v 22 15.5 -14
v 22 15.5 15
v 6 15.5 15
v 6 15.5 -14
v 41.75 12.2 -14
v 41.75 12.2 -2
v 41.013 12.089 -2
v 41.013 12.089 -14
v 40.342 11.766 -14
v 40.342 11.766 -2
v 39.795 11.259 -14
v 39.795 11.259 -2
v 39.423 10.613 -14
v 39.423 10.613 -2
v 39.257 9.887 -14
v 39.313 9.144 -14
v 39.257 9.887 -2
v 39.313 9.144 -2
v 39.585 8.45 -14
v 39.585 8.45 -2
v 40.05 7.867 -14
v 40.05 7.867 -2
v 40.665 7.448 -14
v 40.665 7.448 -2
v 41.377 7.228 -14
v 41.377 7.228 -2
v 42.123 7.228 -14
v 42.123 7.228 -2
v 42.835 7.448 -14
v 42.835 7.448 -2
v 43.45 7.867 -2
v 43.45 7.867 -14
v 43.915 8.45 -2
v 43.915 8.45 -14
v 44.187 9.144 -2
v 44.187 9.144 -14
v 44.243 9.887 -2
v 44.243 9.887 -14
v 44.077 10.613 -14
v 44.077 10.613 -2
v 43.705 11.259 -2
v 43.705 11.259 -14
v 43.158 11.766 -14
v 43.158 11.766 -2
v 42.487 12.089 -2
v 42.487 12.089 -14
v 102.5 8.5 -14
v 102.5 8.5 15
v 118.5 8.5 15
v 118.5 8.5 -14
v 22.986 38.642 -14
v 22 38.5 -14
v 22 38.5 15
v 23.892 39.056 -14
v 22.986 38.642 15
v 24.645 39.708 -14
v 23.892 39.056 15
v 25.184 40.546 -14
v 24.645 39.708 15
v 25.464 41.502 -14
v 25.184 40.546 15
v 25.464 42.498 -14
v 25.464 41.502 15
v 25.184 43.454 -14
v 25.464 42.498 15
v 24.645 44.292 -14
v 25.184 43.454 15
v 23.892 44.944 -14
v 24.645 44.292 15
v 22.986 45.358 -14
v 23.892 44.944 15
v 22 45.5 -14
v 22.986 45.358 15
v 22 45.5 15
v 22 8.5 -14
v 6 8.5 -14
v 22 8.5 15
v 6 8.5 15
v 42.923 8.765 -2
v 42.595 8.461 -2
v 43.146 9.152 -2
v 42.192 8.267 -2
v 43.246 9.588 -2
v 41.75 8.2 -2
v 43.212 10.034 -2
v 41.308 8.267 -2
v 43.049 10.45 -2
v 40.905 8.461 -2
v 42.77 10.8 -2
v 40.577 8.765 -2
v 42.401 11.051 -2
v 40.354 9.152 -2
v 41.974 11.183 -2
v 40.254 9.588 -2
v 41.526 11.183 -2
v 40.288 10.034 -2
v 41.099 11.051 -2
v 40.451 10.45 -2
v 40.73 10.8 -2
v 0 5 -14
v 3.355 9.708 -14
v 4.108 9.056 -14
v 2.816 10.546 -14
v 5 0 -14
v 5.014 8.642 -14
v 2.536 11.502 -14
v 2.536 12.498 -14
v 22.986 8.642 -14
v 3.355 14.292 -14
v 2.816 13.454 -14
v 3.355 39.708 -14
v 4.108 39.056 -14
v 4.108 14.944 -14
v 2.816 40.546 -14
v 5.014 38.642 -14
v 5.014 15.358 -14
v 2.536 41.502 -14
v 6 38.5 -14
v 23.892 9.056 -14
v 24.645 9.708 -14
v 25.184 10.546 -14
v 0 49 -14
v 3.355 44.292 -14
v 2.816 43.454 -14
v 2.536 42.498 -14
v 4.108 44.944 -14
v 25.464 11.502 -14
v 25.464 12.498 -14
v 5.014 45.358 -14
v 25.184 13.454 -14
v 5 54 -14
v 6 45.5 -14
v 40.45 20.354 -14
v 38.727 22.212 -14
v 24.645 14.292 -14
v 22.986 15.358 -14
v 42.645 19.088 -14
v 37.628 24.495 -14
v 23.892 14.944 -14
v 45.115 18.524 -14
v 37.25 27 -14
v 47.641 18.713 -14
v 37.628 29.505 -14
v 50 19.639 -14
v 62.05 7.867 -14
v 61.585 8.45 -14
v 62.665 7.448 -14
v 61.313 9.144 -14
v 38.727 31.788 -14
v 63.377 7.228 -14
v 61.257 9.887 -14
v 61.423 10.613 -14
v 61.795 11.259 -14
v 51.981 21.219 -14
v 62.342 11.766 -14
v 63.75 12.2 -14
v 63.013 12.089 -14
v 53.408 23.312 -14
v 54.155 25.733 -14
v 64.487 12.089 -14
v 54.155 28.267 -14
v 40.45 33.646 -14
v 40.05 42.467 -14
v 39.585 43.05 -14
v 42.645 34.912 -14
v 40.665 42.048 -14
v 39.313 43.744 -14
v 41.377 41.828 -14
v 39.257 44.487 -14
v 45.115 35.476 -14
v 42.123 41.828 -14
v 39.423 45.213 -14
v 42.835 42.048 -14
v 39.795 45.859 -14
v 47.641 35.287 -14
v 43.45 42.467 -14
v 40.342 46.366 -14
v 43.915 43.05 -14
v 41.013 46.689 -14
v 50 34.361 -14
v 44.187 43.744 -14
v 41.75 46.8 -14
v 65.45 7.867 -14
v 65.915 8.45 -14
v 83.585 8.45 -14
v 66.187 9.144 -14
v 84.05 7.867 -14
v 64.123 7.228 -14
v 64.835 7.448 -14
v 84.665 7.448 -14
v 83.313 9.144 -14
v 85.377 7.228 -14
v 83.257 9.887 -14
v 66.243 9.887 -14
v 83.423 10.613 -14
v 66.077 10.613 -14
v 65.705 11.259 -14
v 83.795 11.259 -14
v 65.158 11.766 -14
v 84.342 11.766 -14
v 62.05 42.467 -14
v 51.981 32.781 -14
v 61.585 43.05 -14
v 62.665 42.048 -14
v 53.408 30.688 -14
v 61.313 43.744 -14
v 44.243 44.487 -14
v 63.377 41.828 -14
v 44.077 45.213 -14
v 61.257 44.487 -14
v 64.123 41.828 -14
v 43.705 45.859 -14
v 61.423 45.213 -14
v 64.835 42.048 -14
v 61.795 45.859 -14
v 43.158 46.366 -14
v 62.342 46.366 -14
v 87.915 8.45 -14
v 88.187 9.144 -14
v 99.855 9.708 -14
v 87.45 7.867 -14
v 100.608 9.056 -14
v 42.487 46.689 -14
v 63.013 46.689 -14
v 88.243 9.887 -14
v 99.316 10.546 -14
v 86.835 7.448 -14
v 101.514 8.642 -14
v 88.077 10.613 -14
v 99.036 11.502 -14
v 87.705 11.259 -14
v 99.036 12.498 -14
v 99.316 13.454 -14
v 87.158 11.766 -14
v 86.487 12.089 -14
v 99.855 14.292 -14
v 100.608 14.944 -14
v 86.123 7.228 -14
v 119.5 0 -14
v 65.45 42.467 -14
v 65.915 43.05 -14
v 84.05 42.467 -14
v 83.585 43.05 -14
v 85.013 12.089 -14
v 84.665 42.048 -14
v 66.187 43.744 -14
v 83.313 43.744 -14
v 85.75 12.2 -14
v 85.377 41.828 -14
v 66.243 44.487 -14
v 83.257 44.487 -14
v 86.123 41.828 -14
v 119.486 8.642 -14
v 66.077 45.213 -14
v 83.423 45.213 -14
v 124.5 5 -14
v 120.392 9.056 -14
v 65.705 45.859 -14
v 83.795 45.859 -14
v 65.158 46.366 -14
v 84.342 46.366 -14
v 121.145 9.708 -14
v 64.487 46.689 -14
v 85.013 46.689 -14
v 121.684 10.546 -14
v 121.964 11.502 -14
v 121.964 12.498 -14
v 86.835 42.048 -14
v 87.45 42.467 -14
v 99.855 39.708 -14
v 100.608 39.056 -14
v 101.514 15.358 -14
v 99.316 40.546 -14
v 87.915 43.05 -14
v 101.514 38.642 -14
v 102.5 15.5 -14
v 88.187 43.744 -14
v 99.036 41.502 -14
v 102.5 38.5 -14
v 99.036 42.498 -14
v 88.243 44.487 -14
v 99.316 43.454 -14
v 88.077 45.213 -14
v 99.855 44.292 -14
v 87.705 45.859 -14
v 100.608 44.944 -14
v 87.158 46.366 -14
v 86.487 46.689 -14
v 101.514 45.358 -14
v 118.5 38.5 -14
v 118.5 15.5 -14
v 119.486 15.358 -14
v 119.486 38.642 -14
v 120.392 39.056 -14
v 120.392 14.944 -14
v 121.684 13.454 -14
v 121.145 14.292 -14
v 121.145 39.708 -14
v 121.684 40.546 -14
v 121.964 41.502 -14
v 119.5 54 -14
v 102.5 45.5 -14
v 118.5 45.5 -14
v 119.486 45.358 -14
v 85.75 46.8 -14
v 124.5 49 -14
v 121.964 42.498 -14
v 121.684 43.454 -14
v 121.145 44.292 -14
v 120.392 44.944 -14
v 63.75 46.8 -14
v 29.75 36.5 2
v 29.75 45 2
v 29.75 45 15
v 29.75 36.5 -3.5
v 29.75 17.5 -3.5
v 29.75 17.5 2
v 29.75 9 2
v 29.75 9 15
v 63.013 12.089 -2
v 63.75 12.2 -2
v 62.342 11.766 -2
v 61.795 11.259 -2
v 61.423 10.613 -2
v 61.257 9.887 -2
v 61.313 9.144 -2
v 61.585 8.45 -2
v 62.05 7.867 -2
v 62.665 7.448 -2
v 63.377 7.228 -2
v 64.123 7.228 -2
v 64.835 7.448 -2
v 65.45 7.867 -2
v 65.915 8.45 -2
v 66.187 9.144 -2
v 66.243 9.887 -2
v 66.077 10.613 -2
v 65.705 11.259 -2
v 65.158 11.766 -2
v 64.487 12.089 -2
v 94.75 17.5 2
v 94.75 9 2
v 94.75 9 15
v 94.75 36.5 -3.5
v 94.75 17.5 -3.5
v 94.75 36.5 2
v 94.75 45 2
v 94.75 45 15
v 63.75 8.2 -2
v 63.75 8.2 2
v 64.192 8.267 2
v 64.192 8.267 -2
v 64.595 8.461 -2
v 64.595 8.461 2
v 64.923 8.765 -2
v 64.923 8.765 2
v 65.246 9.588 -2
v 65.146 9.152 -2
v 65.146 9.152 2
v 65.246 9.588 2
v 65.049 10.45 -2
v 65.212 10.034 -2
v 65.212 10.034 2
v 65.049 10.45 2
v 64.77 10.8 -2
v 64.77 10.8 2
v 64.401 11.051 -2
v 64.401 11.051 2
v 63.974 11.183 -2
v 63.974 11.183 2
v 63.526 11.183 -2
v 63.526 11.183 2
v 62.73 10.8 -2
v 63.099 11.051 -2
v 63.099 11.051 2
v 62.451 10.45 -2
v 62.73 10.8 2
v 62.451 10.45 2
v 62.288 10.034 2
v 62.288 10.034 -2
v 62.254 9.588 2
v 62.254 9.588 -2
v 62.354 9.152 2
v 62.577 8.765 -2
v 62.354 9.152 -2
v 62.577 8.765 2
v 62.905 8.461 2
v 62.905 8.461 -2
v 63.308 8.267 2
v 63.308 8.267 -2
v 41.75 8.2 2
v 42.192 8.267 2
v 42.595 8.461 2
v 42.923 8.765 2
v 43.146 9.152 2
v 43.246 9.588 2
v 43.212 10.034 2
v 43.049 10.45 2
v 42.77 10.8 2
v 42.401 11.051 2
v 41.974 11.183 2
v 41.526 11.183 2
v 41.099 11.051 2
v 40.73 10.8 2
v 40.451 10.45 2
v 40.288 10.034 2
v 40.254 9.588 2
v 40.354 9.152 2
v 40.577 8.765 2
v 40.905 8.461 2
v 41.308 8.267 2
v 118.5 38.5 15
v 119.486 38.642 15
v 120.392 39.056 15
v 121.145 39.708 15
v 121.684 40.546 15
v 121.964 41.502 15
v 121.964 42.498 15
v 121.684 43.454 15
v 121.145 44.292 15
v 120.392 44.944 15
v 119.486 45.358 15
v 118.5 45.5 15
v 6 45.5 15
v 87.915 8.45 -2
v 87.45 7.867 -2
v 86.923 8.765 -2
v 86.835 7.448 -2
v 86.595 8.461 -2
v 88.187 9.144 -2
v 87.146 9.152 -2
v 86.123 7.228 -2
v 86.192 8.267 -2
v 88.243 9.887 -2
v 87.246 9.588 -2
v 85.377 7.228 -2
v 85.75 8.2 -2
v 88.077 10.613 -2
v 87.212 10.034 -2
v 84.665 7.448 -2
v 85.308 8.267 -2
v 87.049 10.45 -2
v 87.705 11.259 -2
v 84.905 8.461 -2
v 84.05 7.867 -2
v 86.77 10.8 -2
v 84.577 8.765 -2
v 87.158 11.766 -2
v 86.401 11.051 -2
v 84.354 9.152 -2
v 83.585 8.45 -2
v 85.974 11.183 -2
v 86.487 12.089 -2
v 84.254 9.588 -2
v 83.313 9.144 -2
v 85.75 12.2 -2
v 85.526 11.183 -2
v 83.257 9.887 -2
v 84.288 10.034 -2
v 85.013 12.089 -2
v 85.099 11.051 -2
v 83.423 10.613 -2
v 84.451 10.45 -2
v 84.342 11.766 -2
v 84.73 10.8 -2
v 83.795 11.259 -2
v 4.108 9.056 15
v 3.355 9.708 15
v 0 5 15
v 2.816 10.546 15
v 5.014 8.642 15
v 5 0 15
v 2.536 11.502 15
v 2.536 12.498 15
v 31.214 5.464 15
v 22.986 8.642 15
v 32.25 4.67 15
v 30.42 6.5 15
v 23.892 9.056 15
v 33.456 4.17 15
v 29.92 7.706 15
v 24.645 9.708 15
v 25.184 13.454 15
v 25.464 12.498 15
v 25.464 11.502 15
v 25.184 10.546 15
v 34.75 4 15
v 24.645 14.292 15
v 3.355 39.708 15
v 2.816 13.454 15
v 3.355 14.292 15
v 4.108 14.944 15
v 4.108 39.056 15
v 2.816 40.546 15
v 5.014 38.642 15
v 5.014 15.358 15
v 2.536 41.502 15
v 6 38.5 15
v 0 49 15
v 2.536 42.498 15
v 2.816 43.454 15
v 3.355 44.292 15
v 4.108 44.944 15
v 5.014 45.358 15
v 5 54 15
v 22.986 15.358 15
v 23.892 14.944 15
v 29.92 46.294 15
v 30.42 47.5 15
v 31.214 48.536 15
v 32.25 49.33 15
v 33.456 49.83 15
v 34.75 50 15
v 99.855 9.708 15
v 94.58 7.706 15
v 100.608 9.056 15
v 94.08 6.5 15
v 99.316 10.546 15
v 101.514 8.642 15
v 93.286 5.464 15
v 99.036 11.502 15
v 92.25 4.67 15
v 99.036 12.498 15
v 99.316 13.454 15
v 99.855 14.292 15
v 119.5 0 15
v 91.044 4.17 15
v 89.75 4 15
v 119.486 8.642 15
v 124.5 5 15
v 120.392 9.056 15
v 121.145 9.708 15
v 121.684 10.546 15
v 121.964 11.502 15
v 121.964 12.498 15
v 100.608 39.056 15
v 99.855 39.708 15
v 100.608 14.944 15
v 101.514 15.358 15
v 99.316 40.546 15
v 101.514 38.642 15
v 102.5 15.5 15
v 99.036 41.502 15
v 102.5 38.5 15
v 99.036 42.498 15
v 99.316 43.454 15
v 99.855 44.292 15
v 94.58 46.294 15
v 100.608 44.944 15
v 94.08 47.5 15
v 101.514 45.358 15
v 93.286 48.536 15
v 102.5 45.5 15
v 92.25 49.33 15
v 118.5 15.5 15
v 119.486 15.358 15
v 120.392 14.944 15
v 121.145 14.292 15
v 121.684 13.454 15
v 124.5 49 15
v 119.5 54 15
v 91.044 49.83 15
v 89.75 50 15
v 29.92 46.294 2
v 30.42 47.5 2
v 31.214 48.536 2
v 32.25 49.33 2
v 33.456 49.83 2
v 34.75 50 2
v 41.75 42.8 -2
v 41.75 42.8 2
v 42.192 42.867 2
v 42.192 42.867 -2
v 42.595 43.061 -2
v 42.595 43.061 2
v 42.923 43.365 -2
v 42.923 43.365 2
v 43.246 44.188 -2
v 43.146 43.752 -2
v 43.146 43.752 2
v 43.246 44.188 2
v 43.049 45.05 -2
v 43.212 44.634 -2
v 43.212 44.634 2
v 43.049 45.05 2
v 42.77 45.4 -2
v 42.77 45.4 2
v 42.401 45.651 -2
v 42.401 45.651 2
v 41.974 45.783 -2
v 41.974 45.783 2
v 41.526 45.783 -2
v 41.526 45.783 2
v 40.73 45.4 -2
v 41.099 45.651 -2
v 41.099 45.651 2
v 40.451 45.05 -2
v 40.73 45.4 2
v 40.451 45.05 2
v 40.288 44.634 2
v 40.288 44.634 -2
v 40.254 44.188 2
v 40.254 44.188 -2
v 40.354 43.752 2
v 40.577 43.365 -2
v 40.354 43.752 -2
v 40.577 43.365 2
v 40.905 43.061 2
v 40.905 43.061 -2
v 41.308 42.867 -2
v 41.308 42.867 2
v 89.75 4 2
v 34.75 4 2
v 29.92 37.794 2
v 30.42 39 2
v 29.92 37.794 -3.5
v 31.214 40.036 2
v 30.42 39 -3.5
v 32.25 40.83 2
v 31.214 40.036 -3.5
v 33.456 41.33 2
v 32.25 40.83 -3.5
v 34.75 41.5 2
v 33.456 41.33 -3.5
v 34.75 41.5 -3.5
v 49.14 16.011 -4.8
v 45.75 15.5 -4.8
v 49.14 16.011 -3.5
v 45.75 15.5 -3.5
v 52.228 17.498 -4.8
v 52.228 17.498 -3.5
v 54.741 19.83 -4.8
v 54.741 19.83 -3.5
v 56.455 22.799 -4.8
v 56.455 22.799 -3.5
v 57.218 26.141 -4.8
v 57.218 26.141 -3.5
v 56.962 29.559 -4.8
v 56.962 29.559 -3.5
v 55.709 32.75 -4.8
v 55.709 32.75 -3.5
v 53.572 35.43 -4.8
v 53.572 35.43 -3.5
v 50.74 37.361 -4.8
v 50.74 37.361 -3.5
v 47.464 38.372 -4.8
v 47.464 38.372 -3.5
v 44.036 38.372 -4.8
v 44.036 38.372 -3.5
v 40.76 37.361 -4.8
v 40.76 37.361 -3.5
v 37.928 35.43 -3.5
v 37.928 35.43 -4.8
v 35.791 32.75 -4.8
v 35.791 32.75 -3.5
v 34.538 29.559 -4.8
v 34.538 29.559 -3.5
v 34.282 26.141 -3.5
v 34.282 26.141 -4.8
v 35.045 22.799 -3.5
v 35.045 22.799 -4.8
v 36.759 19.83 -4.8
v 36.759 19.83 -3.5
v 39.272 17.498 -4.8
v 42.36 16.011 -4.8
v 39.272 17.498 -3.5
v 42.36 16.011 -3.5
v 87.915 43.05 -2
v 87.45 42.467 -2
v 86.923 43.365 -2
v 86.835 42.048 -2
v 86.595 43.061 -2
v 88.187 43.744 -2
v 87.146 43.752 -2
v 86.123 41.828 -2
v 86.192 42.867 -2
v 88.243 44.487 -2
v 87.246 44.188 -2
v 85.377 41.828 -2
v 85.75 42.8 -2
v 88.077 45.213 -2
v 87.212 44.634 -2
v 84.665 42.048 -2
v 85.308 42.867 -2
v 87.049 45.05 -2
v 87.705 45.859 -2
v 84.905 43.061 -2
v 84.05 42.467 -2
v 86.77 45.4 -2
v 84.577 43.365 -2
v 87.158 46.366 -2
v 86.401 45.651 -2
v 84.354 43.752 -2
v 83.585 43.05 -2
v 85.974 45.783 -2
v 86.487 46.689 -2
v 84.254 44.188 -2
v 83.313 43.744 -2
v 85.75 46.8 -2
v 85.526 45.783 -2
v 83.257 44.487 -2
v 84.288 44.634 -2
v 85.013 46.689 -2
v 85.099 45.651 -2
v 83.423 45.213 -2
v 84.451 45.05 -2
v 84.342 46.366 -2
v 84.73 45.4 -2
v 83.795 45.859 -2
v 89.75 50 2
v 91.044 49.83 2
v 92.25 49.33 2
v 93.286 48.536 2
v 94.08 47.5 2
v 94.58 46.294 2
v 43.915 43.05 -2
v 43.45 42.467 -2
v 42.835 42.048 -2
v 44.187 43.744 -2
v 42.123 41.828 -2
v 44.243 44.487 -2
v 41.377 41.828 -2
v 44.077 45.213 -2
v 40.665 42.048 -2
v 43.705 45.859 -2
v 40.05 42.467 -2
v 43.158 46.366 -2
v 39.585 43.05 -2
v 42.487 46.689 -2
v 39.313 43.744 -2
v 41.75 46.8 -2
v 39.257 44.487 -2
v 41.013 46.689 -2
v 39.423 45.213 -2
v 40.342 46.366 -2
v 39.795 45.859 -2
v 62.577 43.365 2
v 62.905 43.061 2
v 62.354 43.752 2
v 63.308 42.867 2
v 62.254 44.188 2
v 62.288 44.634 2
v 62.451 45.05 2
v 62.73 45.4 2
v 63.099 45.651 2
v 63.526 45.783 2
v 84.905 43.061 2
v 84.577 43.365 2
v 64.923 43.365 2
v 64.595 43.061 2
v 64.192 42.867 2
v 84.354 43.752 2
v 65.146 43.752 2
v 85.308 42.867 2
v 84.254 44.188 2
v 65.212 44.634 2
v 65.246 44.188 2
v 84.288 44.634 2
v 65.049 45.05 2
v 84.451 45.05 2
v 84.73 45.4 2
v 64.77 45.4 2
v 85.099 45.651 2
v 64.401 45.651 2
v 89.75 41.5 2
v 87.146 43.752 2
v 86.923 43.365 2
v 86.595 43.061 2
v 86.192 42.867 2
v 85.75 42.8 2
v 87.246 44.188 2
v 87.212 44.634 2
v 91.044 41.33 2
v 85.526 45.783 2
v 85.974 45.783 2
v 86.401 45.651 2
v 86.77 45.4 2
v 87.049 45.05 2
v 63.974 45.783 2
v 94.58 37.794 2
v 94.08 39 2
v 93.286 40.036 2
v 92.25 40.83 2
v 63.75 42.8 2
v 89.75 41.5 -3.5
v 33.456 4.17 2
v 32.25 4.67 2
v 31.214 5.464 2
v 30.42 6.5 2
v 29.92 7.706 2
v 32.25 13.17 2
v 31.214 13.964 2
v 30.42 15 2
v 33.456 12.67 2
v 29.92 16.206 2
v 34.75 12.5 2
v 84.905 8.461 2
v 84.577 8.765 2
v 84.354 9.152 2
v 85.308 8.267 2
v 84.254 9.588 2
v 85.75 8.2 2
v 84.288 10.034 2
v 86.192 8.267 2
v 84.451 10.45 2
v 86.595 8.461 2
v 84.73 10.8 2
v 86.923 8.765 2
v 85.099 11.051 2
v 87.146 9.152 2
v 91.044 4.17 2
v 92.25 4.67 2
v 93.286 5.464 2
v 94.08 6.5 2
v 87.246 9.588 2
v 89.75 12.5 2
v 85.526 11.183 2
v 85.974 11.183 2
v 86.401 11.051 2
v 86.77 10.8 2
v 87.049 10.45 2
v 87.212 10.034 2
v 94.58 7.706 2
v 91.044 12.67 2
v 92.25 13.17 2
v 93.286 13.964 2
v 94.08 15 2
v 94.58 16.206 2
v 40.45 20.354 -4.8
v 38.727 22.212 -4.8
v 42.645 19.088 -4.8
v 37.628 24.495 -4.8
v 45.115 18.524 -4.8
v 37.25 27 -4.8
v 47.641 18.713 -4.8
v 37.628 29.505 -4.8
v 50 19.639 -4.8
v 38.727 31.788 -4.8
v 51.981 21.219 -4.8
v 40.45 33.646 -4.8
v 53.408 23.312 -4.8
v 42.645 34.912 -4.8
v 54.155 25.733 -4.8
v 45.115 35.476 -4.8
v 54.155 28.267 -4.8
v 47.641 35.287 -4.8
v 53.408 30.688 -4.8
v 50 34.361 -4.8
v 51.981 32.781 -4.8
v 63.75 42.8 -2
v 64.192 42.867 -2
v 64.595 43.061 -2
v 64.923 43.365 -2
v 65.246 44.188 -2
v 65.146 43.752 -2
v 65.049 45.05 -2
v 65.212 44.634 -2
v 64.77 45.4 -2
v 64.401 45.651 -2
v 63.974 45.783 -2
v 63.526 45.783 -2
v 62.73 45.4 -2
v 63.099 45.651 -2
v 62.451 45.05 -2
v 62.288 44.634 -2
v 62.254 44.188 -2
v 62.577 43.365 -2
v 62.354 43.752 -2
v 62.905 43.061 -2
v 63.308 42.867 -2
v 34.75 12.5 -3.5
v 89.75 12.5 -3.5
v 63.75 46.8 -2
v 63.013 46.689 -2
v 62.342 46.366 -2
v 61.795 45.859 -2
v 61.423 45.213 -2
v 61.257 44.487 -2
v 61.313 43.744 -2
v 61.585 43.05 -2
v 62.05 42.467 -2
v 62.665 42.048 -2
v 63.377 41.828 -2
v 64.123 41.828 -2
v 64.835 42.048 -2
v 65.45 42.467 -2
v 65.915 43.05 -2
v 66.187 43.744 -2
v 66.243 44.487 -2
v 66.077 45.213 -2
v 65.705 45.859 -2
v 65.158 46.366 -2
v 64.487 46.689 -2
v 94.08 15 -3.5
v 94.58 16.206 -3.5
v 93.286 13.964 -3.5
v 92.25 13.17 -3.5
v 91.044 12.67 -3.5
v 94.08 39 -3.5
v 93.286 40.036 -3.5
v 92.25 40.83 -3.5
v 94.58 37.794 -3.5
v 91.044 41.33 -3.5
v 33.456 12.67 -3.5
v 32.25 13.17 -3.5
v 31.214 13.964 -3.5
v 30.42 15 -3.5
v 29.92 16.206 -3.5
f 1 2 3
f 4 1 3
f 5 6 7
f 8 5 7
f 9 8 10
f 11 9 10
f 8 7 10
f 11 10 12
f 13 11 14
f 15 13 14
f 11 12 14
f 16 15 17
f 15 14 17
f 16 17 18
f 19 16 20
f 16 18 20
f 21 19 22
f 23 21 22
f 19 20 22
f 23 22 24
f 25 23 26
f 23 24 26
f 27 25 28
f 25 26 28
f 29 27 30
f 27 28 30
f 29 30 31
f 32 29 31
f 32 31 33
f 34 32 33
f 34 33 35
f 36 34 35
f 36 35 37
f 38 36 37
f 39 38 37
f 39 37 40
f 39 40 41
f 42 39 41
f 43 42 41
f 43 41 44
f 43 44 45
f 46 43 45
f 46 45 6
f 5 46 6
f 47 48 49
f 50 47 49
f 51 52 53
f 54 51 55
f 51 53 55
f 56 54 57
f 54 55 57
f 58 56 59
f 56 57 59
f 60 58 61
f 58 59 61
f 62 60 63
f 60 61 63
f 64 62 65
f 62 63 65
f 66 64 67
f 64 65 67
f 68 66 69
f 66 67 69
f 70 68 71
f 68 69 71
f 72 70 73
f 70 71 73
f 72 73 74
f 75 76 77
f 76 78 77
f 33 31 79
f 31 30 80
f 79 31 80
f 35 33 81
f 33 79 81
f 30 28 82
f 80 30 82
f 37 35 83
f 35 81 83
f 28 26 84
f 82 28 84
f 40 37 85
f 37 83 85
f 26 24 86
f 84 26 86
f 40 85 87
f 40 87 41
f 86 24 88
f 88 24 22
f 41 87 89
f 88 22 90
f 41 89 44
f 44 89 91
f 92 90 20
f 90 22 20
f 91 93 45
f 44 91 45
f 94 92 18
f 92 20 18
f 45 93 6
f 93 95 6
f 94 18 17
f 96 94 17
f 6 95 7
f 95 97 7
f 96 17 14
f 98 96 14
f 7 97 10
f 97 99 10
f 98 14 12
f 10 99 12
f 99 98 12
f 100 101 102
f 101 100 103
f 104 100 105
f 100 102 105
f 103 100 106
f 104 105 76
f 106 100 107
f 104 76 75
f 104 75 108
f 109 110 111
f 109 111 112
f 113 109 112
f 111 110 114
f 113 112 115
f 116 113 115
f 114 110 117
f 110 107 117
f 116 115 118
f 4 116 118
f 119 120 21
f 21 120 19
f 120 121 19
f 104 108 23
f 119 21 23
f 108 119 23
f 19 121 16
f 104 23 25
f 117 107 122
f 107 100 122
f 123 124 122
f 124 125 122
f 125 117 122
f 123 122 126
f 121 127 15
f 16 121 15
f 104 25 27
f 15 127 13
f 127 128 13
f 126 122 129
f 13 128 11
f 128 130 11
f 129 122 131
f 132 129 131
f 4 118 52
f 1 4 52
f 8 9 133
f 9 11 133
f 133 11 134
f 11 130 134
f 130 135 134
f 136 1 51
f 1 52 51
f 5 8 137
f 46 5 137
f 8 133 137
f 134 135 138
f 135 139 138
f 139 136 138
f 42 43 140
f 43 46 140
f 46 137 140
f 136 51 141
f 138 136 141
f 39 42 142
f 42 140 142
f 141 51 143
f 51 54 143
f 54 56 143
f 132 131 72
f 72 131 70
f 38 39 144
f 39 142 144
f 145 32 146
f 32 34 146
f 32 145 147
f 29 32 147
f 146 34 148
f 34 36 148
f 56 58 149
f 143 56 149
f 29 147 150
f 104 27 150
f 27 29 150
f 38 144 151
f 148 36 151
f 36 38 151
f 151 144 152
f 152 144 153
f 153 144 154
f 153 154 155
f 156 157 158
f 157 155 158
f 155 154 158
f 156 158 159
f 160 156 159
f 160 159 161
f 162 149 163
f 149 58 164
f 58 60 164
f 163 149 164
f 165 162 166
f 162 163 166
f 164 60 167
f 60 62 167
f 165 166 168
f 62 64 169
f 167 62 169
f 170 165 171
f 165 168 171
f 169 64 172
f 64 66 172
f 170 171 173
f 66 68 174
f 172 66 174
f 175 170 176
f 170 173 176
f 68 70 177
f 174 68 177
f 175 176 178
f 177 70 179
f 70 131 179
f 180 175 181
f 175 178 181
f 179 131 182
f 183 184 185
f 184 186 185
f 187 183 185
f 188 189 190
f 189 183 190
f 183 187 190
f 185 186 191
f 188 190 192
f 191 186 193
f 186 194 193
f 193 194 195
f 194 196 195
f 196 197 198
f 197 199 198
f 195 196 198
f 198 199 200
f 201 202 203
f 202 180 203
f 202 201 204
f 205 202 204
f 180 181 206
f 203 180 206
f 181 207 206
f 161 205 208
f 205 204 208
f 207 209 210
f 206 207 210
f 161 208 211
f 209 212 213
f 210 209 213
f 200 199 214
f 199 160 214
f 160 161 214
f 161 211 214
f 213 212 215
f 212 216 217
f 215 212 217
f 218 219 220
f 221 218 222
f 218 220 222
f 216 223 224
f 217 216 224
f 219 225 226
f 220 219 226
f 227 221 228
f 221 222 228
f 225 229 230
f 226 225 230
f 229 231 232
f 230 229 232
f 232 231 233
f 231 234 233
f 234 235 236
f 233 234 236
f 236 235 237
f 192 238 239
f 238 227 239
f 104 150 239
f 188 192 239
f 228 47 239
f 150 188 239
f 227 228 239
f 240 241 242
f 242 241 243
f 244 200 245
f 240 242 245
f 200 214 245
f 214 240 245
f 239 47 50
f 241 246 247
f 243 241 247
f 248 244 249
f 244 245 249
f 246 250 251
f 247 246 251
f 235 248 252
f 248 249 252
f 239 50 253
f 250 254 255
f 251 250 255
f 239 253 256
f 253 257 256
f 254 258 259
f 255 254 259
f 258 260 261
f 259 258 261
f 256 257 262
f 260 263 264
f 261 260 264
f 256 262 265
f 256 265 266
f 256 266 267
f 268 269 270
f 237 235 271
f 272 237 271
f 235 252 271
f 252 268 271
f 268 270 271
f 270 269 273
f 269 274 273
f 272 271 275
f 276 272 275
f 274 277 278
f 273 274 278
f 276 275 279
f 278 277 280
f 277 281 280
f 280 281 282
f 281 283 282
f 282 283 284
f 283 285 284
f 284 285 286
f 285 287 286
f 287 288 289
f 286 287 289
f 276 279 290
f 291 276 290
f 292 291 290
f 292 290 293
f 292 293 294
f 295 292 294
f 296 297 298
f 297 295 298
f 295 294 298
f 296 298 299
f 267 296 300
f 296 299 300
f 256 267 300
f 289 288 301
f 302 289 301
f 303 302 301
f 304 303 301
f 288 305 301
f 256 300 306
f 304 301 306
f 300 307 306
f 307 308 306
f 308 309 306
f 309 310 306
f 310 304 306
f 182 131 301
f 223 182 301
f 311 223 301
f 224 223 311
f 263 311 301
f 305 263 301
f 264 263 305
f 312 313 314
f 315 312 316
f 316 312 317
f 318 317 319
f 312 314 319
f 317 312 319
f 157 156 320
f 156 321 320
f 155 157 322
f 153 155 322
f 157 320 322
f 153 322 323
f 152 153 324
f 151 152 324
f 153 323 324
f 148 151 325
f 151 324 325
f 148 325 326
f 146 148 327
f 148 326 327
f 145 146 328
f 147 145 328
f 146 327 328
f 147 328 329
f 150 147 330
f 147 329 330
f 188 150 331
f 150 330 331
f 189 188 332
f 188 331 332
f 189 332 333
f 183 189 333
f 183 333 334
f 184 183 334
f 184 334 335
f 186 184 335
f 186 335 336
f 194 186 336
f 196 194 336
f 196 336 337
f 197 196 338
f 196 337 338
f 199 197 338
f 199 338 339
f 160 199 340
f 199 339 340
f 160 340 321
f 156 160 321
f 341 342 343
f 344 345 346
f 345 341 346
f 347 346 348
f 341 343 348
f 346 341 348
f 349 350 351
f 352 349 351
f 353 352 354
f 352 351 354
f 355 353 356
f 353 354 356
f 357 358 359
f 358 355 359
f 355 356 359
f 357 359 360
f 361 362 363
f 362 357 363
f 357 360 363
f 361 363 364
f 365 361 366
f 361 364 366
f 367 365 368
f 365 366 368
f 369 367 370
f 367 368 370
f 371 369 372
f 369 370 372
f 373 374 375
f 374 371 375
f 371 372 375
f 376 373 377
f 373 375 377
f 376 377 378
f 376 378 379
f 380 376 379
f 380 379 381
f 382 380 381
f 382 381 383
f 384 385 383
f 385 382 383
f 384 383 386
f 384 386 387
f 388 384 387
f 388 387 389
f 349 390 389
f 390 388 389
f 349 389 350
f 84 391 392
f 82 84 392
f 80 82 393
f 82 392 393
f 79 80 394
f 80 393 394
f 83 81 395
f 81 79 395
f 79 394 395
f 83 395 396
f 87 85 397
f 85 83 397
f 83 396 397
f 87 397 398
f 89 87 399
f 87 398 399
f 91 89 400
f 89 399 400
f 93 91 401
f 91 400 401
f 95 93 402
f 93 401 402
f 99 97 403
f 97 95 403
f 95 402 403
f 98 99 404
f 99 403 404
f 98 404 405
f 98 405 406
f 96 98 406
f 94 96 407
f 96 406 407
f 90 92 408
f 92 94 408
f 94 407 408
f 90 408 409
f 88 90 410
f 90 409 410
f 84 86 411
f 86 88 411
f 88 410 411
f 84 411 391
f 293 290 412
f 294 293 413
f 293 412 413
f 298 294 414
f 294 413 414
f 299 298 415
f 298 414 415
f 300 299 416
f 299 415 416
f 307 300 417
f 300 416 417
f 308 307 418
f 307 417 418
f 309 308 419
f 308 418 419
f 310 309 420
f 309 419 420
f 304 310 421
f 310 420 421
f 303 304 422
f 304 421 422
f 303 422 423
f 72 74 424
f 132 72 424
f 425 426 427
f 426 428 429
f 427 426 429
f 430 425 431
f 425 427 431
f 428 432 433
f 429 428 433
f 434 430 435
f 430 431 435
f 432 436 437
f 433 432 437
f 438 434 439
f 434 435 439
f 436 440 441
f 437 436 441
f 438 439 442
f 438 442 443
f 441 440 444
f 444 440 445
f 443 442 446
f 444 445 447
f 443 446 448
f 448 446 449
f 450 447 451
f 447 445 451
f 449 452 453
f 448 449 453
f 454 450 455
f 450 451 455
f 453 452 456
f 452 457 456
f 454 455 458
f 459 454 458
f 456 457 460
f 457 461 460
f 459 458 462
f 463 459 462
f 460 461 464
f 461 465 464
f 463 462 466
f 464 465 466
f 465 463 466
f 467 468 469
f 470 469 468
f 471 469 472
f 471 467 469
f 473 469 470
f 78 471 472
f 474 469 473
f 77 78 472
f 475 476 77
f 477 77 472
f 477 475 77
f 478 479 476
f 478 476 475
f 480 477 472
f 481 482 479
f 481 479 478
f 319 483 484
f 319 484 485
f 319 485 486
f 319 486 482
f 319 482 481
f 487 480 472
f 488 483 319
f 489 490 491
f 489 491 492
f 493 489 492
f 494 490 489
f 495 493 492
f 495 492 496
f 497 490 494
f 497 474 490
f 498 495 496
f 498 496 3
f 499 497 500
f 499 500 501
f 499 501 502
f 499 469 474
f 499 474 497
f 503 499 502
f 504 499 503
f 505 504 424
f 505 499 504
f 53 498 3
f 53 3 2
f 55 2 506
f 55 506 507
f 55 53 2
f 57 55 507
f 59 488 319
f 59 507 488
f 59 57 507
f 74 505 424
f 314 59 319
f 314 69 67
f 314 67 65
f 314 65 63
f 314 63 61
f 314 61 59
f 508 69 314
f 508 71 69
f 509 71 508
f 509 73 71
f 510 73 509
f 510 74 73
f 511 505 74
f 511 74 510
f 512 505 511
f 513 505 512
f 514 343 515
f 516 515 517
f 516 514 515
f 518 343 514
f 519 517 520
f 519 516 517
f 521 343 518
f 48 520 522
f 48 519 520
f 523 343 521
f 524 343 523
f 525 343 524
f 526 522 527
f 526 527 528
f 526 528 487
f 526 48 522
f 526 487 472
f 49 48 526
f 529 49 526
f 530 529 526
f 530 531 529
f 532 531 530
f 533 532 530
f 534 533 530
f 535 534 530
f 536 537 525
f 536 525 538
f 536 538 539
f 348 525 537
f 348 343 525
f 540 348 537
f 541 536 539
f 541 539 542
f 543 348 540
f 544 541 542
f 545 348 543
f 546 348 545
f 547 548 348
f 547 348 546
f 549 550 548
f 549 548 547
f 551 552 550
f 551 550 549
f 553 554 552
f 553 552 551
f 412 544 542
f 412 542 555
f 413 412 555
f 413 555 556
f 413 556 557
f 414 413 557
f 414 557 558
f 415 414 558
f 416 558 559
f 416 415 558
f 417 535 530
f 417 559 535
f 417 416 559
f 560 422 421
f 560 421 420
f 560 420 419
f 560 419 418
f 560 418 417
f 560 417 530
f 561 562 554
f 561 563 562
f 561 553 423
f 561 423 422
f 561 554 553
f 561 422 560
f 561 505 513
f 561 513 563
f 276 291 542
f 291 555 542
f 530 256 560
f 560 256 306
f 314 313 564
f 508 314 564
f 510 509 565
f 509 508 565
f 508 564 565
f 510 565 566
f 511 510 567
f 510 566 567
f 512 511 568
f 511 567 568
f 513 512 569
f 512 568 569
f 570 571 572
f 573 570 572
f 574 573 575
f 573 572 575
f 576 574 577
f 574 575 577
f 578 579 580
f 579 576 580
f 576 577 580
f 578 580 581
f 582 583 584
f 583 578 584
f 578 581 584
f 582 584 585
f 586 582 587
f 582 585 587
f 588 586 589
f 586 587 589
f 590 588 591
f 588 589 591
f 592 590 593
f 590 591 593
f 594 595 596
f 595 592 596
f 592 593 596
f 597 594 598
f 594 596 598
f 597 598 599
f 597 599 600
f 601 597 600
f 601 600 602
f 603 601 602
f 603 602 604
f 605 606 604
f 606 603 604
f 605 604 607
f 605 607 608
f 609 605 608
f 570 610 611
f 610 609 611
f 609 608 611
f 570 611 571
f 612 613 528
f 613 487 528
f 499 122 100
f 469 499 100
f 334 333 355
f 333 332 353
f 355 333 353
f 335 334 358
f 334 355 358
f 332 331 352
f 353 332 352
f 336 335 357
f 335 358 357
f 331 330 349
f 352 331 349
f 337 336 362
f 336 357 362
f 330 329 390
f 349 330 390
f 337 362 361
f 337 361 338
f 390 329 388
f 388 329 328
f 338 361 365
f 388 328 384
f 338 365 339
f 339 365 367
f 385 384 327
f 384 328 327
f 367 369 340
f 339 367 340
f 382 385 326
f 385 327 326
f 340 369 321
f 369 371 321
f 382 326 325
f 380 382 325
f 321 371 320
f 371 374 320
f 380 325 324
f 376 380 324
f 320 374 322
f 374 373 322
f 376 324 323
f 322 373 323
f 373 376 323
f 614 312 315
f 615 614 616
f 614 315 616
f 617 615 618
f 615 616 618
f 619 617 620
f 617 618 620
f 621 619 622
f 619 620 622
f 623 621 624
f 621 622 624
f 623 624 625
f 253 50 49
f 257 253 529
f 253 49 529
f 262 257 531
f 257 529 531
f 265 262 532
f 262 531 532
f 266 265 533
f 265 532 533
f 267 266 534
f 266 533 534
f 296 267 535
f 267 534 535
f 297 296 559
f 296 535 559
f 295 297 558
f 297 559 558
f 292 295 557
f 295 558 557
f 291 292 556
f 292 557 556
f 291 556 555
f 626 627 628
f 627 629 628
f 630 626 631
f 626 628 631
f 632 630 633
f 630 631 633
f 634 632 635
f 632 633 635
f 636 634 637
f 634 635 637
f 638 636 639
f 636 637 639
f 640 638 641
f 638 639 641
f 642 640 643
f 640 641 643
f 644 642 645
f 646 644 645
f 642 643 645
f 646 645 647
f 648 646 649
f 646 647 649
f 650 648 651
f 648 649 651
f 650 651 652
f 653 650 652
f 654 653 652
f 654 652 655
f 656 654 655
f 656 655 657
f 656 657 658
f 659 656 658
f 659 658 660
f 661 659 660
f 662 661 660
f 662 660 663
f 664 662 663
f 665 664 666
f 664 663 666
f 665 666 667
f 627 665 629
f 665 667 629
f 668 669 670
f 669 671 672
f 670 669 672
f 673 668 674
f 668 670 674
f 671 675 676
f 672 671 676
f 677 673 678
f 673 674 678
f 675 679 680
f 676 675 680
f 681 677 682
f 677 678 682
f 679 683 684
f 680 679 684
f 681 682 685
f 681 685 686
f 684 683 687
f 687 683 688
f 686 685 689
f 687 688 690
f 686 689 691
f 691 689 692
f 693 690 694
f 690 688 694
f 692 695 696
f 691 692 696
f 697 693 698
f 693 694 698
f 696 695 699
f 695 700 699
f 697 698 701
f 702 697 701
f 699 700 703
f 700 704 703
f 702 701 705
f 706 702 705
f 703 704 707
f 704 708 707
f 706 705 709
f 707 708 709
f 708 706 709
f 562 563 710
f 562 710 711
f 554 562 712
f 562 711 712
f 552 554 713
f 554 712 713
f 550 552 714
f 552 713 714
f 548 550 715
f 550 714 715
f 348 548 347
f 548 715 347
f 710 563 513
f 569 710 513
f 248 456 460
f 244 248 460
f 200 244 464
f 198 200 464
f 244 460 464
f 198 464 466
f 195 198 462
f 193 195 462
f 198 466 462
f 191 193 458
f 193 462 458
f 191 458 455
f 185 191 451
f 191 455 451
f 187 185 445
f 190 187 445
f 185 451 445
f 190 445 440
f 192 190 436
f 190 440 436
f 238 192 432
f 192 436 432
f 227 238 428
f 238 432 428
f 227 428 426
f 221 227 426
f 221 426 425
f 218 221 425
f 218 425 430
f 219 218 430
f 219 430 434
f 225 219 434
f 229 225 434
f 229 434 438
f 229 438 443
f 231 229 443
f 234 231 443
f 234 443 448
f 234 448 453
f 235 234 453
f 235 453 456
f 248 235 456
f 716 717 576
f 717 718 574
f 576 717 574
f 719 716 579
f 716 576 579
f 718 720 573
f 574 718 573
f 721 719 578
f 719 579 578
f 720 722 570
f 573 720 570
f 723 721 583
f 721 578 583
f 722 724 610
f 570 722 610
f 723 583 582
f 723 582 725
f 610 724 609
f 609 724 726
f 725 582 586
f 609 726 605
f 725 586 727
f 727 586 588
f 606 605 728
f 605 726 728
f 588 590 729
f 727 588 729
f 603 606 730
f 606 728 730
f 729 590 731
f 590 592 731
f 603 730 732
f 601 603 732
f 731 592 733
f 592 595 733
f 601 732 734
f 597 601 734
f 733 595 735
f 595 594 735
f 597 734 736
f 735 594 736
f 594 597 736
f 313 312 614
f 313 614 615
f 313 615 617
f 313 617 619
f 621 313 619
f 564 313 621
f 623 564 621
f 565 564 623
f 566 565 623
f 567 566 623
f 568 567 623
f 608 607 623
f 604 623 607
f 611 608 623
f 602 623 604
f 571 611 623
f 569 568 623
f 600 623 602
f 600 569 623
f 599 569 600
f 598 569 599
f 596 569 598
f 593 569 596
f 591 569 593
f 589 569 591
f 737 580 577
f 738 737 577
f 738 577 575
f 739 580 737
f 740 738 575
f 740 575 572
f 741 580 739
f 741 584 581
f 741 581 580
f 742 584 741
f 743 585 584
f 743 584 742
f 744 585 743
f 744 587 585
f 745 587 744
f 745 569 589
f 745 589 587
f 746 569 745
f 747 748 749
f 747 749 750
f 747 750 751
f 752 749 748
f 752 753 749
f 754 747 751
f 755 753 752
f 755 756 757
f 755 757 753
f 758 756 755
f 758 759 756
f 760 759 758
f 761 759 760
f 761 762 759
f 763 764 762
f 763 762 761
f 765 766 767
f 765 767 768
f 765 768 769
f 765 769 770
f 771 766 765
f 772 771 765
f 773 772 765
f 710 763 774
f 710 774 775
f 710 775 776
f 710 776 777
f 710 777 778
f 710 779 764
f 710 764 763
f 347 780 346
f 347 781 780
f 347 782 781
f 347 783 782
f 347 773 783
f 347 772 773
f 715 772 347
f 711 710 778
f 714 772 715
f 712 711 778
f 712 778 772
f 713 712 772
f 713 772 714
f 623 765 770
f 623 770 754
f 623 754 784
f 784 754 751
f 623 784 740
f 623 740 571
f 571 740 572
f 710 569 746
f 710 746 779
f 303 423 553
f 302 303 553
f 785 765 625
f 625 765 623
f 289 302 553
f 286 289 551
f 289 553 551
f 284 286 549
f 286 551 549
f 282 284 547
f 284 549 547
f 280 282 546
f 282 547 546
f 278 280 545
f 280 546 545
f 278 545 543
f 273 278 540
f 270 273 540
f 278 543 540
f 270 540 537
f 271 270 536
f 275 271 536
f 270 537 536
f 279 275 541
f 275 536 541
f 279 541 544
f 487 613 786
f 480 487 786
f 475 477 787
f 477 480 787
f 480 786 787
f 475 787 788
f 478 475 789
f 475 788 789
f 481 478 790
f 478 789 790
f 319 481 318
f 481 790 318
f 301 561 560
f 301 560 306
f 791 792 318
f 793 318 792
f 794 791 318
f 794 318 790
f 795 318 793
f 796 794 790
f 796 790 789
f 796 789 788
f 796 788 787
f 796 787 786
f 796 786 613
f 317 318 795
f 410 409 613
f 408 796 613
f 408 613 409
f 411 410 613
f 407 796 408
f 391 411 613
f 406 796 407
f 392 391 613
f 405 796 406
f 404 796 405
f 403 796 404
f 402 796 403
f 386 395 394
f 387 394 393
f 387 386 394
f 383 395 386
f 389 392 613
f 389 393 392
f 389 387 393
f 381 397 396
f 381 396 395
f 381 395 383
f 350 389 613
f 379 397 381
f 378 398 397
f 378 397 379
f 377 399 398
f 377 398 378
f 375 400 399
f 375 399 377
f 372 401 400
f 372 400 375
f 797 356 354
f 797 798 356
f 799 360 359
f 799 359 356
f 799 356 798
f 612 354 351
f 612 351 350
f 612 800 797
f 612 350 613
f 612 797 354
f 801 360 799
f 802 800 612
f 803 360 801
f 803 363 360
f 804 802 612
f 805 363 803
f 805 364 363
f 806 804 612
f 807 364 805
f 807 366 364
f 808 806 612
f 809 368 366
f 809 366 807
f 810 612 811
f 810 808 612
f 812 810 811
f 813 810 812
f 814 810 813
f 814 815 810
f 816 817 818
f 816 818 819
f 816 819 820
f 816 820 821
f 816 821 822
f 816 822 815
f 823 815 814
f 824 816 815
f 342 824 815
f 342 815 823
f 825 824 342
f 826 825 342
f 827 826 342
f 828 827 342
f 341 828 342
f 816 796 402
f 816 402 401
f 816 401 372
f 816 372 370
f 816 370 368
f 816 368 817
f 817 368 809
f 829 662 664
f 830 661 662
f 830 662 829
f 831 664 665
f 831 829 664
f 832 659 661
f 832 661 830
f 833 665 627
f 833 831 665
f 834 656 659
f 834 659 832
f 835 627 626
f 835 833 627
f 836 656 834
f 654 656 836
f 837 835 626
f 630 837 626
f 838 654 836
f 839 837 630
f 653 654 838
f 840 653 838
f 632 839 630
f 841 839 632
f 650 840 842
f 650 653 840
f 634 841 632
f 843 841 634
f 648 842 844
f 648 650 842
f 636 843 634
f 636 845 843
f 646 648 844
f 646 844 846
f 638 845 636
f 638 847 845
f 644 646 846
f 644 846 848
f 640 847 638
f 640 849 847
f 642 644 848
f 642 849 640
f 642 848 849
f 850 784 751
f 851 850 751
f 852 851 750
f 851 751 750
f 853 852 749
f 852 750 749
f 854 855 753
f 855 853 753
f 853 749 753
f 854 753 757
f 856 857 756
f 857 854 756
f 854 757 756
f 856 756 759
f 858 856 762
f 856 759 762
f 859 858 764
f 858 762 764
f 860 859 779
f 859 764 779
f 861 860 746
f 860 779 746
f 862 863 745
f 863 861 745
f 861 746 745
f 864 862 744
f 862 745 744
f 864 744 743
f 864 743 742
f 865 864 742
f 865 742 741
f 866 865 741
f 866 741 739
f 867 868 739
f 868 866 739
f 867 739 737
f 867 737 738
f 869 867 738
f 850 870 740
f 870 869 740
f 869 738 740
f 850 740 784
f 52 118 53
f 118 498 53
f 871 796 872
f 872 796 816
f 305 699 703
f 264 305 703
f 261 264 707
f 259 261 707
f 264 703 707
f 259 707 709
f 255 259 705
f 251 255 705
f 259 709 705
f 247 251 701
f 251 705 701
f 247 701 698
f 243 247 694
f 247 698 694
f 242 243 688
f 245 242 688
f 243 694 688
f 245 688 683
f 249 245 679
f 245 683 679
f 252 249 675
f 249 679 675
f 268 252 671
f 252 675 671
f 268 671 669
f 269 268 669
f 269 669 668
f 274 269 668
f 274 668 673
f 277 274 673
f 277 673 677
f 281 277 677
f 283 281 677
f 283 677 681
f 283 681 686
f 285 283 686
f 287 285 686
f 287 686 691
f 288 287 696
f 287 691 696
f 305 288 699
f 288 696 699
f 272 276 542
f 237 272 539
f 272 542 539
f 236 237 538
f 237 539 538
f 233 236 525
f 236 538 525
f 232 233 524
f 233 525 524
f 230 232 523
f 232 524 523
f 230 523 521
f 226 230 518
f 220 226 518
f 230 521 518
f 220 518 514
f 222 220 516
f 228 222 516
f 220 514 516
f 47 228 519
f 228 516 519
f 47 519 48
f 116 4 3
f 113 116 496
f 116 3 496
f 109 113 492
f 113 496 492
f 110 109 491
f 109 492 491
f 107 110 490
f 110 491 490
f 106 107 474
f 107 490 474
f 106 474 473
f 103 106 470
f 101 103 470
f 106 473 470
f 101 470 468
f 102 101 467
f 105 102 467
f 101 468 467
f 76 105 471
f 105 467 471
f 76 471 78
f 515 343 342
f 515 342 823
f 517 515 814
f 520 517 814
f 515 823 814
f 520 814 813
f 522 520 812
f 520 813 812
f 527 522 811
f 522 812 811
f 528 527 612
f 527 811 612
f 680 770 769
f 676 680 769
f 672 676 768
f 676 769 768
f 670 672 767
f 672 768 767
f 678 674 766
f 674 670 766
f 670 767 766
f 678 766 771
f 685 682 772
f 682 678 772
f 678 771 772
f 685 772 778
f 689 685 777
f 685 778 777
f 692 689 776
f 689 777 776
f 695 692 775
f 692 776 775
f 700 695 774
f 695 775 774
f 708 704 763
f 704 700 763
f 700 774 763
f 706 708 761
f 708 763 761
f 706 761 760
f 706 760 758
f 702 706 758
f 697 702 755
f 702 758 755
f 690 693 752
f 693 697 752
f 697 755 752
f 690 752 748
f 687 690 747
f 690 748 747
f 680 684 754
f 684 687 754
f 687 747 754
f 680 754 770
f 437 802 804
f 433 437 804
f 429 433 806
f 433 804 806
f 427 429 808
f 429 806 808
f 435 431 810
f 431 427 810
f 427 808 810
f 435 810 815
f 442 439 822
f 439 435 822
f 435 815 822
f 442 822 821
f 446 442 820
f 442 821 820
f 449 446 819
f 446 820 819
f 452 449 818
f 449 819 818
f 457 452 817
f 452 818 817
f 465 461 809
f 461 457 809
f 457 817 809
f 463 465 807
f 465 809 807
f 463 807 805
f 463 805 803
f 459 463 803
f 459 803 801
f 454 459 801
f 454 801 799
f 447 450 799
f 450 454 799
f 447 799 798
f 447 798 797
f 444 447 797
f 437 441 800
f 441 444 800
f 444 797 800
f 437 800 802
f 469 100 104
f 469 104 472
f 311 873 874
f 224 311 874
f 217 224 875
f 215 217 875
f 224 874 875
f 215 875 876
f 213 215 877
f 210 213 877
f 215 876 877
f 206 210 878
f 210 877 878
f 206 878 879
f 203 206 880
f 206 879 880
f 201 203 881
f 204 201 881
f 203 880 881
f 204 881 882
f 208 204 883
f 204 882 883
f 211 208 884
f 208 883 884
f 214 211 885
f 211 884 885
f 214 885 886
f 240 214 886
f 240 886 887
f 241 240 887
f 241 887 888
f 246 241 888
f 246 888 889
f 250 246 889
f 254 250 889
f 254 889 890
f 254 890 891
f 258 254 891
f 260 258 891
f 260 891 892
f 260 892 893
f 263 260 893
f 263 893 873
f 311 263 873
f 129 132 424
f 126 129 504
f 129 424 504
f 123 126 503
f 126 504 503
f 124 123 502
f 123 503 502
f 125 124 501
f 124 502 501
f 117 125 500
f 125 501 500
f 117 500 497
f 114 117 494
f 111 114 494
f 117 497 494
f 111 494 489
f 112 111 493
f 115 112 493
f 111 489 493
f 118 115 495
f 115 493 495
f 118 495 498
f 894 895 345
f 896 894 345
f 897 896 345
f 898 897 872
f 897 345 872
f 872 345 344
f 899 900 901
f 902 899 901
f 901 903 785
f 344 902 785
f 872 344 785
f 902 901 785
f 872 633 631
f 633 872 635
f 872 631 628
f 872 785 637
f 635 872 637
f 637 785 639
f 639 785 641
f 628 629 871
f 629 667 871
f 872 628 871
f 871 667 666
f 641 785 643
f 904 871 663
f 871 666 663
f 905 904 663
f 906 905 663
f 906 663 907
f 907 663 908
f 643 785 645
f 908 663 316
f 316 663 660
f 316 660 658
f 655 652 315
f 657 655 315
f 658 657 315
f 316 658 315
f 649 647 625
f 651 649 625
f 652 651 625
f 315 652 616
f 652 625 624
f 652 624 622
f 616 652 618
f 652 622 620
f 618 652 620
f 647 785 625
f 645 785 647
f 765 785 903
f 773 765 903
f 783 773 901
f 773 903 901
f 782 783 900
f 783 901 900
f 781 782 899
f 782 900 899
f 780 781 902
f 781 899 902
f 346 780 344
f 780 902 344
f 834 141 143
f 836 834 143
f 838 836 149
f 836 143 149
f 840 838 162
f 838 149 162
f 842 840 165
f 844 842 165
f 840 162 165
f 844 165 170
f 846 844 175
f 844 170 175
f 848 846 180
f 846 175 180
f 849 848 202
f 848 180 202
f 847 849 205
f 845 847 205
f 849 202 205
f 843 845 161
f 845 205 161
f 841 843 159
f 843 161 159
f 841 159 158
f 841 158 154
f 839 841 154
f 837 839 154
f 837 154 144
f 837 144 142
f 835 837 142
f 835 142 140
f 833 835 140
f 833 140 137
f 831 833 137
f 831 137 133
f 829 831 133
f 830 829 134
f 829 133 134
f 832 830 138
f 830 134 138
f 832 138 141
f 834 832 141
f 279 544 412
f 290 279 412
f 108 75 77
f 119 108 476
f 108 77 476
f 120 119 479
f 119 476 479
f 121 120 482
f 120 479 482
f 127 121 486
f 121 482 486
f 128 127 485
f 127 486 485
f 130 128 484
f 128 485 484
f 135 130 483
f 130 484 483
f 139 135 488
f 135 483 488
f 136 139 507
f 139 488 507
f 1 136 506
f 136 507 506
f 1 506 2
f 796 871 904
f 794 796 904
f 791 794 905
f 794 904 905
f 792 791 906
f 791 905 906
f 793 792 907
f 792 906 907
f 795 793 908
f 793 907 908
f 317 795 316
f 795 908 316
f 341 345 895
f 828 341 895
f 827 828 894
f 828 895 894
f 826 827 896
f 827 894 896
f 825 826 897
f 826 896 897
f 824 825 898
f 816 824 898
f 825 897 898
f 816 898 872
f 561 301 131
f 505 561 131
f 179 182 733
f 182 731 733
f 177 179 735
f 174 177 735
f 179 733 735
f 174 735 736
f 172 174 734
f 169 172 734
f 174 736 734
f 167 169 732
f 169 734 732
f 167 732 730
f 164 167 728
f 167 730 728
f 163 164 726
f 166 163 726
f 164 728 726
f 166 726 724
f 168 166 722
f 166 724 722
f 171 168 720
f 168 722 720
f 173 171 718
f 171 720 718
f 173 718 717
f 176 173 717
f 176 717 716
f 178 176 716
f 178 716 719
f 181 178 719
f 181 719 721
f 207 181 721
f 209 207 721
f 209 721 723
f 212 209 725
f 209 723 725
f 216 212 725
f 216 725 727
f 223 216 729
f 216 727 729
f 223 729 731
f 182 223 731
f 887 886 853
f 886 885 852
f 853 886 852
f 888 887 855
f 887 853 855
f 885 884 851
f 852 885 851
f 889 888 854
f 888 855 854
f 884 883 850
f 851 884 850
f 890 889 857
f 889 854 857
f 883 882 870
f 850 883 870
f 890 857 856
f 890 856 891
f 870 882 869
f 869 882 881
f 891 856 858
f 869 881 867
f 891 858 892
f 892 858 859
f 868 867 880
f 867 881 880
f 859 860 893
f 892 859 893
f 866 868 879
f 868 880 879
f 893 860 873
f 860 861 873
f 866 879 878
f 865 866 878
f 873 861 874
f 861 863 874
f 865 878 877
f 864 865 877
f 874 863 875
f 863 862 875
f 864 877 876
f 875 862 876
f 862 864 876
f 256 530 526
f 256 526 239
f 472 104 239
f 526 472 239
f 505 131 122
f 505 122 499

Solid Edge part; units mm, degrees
sketch "Sketch1" plane through (0, 0, 0) normal (0, 0, 1) x (1, 0, 0)
  line L0 (0, 0) -> (124.5, 0)
  line L1 (124.5, 0) -> (124.5, 54)
  line L2 (124.5, 54) -> (0, 54)
  line L3 (0, 54) -> (0, 0)
extrude "Protrusion1" add sketch "Sketch1" along normal up to vertex (15 mm away) and the other way up to vertex (17.5 mm away)
chamfer "Chamfer1" distance 5 angle 45 4 edges at (0, 0, -1.25) (124.5, 0, -1.25) (124.5, 54, -1.25) (0, 54, -1.25)
sketch "Sketch2" plane through (62.25, 27, 15) normal (0, 0, 1) x (1, 0, 0)
  line L0 (-56.25, 11.5) -> (-40.25, 11.5)
  line L1 (-40.25, 18.5) -> (-56.25, 18.5)
  arc A0 (-40.25, 18.5) -> (-40.25, 11.5) centre (-40.25, 15) cw
  arc A1 (-56.25, 11.5) -> (-56.25, 18.5) centre (-56.25, 15) cw
extrude "Cutout1" cut sketch "Sketch2" against normal through all
pattern_linear "Pattern1" count 2 spacing 96.5 along (1, 0, 0) count 2 spacing 30 along (0, -1, 0) of "Cutout1"
sketch "Sketch3" plane through (62.25, 27, 15) normal (0, 0, 1) x (1, 0, 0)
  line L0 (32.5, 14.5) -> (-32.5, 14.5)
  line L1 (-32.5, 14.5) -> (-32.5, -14.5)
  line L2 (-32.5, -14.5) -> (32.5, -14.5)
  line L3 (32.5, -14.5) -> (32.5, 14.5)
extrude "Cutout2" cut sketch "Sketch3" against normal through all
sketch "Sketch4" plane through (62.25, 27, 15) normal (0, 0, 1) x (1, 0, 0)
  line L0 (32.5, 23) -> (-32.5, 23)
  line L1 (-32.5, 23) -> (-32.5, -23)
  line L2 (-32.5, -23) -> (32.5, -23)
  line L3 (32.5, -23) -> (32.5, 23)
extrude "VaciadoExtruido_3" cut sketch "Sketch4" against normal blind 13
fillet "Redondeo_1" radius 5 8 edges at (29.75, 50, 8.5) (94.75, 50, 8.5) (94.75, 4, 8.5) (94.75, 12.5, -7.75) (94.75, 41.5, -7.75) (29.75, 41.5, -7.75) (29.75, 4, 8.5) (29.75, 12.5, -7.75)
sketch "Sketch5" plane through (62.25, 27, -17.5) normal (0, 0, -1) x (-1, 0, 0)
  line L0 (-32.5, 23) -> (-32.5, -23)
  line L1 (-32.5, -23) -> (32.5, -23)
  line L2 (32.5, -23) -> (32.5, 23)
  line L3 (32.5, 23) -> (-32.5, 23)
extrude "Protrusion2" add sketch "Sketch5" against normal up to vertex (14 mm away)
sketch "Sketch6" plane through (62.25, 27, -17.5) normal (0, 0, -1) x (-1, 0, 0)
  circle A0 centre (16.5, 0) radius 8.5
extrude "Cutout3" cut sketch "Sketch6" against normal up to vertex (14 mm away)
hole "Agujero_1" at (41.75, 9.7, 2) direction (0, 0, -1) diameter 3 end through all
hole "Hole1" at (63.75, 9.7, 2) direction (0, 0, -1) diameter 3 end through all
hole "Hole2" at (85.75, 9.7, 2) direction (0, 0, -1) diameter 3 end through all
hole "Hole3" at (41.75, 44.3, 2) direction (0, 0, -1) diameter 3 end through all
hole "Hole4" at (63.75, 44.3, 2) direction (0, 0, -1) diameter 3 end through all
hole "Hole5" at (85.75, 44.3, 2) direction (0, 0, -1) diameter 3 end through all
sketch "Sketch7" plane through (14, 27, -14) normal (0, 0, -1) x (-1, 0, 0)
  line L0 (15.0837, -36.0096) -> (-114.5837, -36.0096)
  line L1 (-114.5837, -36.0096) -> (-114.5837, 36.0096)
  line L2 (-114.5837, 36.0096) -> (15.0837, 36.0096)
  line L3 (15.0837, 36.0096) -> (15.0837, -36.0096)
extrude "VaciadoExtruido_8" cut sketch "Sketch7" along normal through all
hole "Agujero_7" at (41.75, 9.7, -14) direction (0, 0, 1) diameter 3 end up to next counterbore diameter 5 counterbore depth 12
hole "Hole6" at (63.75, 9.7, -14) direction (0, 0, 1) diameter 3 end up to next counterbore diameter 5 counterbore depth 12
hole "Hole7" at (85.75, 9.7, -14) direction (0, 0, 1) diameter 3 end up to next counterbore diameter 5 counterbore depth 12
hole "Hole8" at (41.75, 44.3, -14) direction (0, 0, 1) diameter 3 end up to next counterbore diameter 5 counterbore depth 12
hole "Hole9" at (63.75, 44.3, -14) direction (0, 0, 1) diameter 3 end up to next counterbore diameter 5 counterbore depth 12
hole "Hole10" at (85.75, 44.3, -14) direction (0, 0, 1) diameter 3 end up to next counterbore diameter 5 counterbore depth 12
sketch "Sketch8" plane through (62.25, 27, -3.5) normal (0, 0, 1) x (0, -1, 0)
  circle A0 centre (0, -16.5) radius 11.5
  dimension "D1" = 23
extrude "VaciadoExtruido_9" cut sketch "Sketch8" against normal blind 1.3
properties part number "1976-1300-002" material "Aluminio, 7075-T6"
